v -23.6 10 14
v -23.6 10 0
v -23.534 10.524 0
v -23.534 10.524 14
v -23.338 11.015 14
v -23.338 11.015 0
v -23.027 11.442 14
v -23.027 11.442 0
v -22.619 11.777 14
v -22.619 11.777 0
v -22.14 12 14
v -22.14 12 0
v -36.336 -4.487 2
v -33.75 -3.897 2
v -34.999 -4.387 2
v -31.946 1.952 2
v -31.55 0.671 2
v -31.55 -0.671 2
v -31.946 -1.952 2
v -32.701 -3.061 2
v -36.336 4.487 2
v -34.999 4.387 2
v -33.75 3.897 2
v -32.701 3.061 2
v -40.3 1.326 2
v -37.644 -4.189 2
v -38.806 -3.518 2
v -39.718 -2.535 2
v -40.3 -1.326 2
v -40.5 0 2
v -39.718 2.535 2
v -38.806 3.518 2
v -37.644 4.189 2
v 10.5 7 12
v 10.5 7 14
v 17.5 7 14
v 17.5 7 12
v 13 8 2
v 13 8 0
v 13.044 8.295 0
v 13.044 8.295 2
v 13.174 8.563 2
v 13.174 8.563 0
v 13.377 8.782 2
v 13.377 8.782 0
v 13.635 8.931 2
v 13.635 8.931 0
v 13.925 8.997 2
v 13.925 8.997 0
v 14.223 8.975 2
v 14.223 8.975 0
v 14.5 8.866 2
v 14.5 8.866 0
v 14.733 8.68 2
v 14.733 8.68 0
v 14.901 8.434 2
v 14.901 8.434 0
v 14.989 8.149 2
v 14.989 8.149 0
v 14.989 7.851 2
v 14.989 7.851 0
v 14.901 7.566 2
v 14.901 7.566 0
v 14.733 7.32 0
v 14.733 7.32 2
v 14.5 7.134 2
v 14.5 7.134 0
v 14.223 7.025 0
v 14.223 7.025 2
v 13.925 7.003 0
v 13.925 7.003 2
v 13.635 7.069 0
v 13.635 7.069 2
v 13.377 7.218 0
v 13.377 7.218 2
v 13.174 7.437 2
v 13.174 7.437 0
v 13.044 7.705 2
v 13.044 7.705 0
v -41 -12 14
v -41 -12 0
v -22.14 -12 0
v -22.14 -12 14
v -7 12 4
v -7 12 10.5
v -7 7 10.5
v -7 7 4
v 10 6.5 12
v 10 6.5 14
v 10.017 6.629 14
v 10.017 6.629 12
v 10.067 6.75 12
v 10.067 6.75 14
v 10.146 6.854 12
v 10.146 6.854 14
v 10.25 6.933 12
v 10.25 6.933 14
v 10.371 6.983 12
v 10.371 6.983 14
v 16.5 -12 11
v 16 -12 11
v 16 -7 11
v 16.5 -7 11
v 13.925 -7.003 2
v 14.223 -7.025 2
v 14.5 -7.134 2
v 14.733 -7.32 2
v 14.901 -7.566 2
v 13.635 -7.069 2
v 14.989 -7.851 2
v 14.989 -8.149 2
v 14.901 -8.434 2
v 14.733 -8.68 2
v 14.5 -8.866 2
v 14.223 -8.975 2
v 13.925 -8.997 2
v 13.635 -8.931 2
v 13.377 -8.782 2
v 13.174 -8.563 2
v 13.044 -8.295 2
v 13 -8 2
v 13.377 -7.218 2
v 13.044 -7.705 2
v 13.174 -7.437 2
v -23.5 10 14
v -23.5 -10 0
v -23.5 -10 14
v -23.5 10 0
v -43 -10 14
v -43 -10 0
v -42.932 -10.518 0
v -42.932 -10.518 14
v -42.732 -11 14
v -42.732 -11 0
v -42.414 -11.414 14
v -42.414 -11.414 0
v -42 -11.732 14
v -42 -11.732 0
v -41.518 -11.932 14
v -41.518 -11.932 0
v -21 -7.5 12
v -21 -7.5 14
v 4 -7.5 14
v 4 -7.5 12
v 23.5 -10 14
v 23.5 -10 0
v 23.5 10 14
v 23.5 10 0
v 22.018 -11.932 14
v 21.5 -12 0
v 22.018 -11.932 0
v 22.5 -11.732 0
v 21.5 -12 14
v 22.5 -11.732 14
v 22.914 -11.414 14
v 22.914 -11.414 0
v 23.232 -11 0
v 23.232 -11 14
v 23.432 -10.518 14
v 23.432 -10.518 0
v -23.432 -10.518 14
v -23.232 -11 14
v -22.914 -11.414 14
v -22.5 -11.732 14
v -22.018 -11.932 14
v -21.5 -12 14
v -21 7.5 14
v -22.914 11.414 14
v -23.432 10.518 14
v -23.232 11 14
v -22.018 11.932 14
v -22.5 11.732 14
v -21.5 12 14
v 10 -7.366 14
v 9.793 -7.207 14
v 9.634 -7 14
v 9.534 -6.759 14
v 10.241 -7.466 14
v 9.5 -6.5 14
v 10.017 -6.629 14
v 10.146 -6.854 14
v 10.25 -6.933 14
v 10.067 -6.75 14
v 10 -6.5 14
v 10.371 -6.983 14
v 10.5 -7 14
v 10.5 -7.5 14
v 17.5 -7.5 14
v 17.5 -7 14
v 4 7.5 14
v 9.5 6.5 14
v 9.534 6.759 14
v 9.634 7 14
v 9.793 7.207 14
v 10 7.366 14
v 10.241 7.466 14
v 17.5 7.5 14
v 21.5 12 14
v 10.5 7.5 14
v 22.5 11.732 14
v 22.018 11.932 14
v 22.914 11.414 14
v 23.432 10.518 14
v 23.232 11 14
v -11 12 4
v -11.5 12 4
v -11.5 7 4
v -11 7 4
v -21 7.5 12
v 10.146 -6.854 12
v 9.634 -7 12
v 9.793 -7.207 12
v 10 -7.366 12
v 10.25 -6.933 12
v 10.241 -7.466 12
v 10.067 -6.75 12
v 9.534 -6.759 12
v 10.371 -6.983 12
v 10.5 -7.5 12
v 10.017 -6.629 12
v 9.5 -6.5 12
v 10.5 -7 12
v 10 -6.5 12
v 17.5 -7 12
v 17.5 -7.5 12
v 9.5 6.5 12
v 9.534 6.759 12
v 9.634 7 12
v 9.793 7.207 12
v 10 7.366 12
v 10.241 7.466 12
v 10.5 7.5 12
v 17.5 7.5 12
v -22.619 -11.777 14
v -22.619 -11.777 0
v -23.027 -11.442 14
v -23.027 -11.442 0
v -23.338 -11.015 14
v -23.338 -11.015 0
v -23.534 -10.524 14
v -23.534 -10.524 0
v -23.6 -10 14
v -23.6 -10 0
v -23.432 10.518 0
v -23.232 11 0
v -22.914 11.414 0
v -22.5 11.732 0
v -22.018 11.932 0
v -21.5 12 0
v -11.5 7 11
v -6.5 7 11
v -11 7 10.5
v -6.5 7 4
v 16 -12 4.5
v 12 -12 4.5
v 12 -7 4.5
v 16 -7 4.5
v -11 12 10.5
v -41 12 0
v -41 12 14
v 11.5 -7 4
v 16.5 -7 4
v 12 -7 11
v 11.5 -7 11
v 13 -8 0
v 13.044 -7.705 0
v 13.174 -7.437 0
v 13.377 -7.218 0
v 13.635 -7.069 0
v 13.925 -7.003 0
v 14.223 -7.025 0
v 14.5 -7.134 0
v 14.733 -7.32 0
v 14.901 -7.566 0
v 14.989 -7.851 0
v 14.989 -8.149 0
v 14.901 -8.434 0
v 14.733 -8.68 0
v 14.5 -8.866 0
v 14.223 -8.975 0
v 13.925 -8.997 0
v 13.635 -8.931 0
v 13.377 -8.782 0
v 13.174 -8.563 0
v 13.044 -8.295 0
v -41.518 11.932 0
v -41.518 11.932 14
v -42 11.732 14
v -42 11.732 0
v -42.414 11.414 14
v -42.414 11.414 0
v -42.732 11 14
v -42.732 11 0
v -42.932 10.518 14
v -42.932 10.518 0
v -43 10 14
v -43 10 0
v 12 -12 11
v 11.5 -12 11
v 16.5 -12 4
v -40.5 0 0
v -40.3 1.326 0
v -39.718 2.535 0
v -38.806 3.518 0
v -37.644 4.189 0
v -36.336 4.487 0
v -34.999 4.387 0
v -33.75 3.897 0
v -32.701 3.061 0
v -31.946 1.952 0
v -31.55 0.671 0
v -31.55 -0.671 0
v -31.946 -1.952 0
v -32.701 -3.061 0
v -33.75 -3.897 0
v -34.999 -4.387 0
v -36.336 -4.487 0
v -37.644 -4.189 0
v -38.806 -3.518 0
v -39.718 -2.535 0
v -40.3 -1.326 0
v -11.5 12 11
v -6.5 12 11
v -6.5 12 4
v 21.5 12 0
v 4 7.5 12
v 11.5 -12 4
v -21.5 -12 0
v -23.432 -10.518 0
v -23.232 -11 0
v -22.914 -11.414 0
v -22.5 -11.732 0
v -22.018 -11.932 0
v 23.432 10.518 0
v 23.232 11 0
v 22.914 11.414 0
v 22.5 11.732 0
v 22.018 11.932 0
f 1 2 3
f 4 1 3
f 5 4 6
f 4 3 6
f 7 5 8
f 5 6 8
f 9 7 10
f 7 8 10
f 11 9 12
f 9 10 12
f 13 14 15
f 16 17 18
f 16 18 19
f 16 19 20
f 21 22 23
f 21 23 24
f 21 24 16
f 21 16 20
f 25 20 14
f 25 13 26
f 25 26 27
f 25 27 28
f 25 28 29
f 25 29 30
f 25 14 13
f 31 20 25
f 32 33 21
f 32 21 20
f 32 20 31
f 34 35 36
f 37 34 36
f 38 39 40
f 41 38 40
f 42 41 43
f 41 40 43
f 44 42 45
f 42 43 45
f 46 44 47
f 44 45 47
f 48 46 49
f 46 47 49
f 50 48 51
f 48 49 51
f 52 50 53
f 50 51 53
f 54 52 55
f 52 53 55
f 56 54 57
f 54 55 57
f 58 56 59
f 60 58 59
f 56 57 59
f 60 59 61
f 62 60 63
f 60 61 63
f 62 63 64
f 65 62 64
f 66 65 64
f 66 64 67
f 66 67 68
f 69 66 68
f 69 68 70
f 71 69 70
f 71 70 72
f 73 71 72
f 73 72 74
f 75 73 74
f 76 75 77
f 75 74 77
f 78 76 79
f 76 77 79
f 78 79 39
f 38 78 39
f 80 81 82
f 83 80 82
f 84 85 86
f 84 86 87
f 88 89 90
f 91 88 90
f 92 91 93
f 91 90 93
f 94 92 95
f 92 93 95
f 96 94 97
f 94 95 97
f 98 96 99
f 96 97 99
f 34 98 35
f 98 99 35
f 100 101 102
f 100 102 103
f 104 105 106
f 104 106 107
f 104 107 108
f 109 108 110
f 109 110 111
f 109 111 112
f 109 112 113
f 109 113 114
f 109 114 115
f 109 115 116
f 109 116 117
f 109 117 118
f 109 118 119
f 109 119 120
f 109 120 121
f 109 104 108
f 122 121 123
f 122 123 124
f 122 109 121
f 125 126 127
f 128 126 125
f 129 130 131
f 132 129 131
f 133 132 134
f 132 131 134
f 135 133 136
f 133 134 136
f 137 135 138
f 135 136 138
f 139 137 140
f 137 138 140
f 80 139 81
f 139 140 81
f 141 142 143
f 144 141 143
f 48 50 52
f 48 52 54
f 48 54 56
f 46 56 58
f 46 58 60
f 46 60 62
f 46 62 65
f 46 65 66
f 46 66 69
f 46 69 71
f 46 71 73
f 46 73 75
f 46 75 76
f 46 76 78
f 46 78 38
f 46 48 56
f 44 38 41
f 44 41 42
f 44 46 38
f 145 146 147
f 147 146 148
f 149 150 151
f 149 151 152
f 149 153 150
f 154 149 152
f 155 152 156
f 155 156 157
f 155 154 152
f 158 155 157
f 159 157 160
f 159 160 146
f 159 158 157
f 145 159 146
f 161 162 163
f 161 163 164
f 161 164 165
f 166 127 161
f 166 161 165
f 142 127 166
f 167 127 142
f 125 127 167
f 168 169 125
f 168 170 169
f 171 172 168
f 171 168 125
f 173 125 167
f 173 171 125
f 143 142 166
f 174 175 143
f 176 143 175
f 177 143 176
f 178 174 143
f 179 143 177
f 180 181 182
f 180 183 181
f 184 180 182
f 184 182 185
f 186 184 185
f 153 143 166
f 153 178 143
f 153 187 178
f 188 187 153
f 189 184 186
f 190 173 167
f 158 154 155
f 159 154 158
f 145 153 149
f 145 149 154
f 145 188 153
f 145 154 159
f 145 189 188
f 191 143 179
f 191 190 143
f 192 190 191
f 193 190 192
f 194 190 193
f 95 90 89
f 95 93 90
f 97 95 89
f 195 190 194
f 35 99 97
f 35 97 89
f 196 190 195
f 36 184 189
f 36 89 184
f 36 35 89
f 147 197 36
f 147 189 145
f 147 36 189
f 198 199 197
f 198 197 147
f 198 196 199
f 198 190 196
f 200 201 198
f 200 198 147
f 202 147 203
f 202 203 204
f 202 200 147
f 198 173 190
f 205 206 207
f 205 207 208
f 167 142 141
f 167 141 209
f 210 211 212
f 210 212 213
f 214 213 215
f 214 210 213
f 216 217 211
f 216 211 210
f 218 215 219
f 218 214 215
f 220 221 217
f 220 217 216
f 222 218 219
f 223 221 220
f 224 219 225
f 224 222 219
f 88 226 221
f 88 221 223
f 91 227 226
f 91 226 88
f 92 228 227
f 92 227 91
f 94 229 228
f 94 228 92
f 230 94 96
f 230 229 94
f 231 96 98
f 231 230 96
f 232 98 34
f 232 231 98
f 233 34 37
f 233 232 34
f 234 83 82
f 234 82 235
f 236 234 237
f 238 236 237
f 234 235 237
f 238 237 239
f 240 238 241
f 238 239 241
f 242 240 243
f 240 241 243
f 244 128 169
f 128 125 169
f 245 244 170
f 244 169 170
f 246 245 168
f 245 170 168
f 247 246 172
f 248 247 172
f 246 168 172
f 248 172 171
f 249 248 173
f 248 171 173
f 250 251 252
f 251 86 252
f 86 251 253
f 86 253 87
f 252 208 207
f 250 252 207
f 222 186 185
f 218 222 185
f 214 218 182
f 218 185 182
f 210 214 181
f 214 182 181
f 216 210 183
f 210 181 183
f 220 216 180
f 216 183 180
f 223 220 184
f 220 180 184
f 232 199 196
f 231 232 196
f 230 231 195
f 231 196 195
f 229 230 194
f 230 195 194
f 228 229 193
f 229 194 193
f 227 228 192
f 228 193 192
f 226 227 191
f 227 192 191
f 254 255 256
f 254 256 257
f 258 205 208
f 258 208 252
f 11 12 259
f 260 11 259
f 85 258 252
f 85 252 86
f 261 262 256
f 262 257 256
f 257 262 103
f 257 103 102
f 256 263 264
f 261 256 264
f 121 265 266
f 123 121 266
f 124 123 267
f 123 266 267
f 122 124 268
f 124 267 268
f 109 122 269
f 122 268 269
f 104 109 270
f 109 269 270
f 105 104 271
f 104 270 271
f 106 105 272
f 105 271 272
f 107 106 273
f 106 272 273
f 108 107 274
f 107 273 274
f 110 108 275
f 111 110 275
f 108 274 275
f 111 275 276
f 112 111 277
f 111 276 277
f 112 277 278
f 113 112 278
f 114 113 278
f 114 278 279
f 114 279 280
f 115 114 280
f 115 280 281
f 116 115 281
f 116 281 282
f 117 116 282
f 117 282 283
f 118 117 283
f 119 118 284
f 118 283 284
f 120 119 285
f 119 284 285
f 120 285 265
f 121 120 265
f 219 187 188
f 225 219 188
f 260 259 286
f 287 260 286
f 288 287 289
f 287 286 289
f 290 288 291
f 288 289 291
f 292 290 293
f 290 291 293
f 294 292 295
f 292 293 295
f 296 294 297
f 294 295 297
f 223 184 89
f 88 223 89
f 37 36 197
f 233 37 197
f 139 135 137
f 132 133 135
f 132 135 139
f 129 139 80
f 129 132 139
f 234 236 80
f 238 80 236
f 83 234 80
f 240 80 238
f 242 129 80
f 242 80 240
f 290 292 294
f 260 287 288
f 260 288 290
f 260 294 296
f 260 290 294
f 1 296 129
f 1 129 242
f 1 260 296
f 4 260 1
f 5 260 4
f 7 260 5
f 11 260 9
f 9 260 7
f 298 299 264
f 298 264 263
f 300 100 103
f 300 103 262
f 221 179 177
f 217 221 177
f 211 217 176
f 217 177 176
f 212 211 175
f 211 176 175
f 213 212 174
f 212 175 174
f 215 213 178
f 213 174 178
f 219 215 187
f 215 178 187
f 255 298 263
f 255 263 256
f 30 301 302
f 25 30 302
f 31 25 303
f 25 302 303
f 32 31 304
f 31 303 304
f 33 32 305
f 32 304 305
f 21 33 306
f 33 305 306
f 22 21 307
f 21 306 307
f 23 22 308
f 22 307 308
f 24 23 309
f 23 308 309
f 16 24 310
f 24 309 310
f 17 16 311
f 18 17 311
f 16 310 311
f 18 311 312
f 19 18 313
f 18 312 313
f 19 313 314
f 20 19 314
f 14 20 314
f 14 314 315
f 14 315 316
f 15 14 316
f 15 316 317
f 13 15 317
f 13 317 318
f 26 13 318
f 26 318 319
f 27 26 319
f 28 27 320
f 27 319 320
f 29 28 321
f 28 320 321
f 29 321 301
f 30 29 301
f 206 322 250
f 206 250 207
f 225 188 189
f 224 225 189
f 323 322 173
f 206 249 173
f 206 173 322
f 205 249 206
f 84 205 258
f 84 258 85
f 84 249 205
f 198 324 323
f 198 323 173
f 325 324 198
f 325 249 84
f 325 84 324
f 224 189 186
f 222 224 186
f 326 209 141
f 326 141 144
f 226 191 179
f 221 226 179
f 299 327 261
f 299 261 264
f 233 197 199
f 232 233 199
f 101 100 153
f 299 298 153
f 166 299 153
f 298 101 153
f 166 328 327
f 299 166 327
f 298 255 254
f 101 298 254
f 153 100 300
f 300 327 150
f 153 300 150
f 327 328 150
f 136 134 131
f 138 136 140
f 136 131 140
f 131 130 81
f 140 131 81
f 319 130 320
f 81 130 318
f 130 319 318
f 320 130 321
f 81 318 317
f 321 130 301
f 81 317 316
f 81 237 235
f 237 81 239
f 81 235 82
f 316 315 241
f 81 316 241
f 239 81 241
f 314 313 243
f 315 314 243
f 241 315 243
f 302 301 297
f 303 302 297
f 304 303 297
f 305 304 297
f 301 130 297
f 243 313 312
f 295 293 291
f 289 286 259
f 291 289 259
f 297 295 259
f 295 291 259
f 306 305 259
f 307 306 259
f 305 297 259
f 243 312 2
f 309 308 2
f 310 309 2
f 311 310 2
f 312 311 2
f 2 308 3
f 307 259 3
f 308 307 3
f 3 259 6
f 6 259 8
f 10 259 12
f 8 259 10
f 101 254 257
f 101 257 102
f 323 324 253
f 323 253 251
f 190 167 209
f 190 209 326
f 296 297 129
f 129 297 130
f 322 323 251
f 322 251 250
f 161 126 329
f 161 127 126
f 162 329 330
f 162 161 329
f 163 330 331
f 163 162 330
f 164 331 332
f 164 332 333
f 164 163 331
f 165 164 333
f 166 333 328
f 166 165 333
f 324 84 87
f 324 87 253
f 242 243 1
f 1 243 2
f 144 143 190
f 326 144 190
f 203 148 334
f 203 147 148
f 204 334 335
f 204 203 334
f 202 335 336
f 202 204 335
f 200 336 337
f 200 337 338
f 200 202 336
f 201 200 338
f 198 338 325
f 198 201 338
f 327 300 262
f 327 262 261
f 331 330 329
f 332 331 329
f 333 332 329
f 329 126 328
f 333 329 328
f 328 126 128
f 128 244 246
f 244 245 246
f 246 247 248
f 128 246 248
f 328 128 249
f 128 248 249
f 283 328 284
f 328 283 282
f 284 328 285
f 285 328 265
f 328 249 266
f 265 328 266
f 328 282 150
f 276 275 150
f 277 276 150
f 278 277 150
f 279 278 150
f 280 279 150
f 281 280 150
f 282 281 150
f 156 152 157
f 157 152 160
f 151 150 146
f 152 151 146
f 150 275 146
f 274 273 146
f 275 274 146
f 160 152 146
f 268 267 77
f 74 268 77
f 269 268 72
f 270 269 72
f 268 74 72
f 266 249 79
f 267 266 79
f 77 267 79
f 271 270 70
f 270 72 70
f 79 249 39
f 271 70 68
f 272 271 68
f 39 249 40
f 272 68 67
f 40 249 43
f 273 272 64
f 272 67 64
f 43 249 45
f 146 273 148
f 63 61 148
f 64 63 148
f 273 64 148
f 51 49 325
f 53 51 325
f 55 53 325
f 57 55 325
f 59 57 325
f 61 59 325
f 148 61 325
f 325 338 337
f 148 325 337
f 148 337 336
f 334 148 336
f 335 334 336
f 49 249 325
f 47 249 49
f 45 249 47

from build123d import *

# Parameters (mm, degrees)
CROQUIS1_W              = 47
CROQUIS1_H              = 24
SALIENTE_EXTRUIR1_DEPTH = 14
REDONDEO1_R             = 2
CROQUIS2_W              = 25
CROQUIS2_H              = 15
CORTAR_EXTRUIR1_DEPTH   = 2
CORTAR_EXTRUIR2_DEPTH   = 5
CORTAR_EXTRUIR3_DEPTH   = 5
SALIENTE_EXTRUIR3_DEPTH = 14
CROQUIS6_R              = 4.5
CROQUIS6_R_2            = 1
CORTAR_EXTRUIR4_DEPTH   = 2


with BuildPart() as part:
    # Croquis1 → Saliente-Extruir1 (new body)
    with BuildSketch(Plane.XY):
        Rectangle(CROQUIS1_W, CROQUIS1_H)
    extrude(amount=SALIENTE_EXTRUIR1_DEPTH)

    # Redondeo1
    redondeo1_edges = [part.edges().sort_by_distance(p)[0] for p in [
        (-23.5, 12, 7),
        (23.5, 12, 7),
        (23.5, -12, 7),
        (-23.5, -12, 7),
    ]]
    fillet(redondeo1_edges, radius=REDONDEO1_R)

    # Croquis2 → Cortar-Extruir1 (cut)
    with BuildSketch(Plane.XY.offset(14)):
        with Locations((-8.5, 0)):
            Rectangle(CROQUIS2_W, CROQUIS2_H)
        with BuildLine():
            Line((17.5, 7.5), (10.5, 7.5))
            ThreePointArc((10.5, 7.5), (9.792893219, 7.207106781), (9.5, 6.5))
            Line((9.5, 6.5), (9.5, -6.5))
            ThreePointArc((9.5, -6.5), (9.792893219, -7.207106781), (10.5, -7.5))
            Line((10.5, -7.5), (17.5, -7.5))
            Line((17.5, -7.5), (17.5, -7))
            Line((17.5, -7), (10.5, -7))
            ThreePointArc((10.5, -7), (10.146446609, -6.853553391), (10, -6.5))
            Line((10, -6.5), (10, 6.5))
            ThreePointArc((10, 6.5), (10.146446609, 6.853553391), (10.5, 7))
            Line((10.5, 7), (17.5, 7))
            Line((17.5, 7), (17.5, 7.5))
        make_face()
    extrude(amount=-CORTAR_EXTRUIR1_DEPTH, mode=Mode.SUBTRACT)

    # Croquis3 → Cortar-Extruir2 (cut)
    with BuildSketch(Plane(origin=(0, 12, 0), x_dir=(1, 0, 0), z_dir=(0, 1, 0))):
        Polygon((-6.5, -4), (-6.5, -11), (-11.5, -11), (-11.5, -4), (-11, -4), (-11, -10.5), (-7, -10.5), (-7, -4), align=None)
    extrude(amount=-CORTAR_EXTRUIR2_DEPTH, mode=Mode.SUBTRACT)

    # Croquis4 → Cortar-Extruir3 (cut)
    with BuildSketch(Plane.XZ.offset(12)):
        Polygon((16.5, 11), (16.5, 4), (11.5, 4), (11.5, 11), (12, 11), (12, 4.5), (16, 4.5), (16, 11), align=None)
    extrude(amount=-CORTAR_EXTRUIR3_DEPTH, mode=Mode.SUBTRACT)


with BuildPart() as body_2:
    # Croquis5 → Saliente-Extruir3 (new body)
    with BuildSketch(Plane.XY):
        with BuildLine():
            Line((-22.140312424, 12), (-41, 12))
            ThreePointArc((-41, 12), (-42.414213562, 11.414213562), (-43, 10))
            Line((-43, 10), (-43, -10))
            ThreePointArc((-43, -10), (-42.414213562, -11.414213562), (-41, -12))
            Line((-41, -12), (-22.140312424, -12))
            ThreePointArc((-22.140312424, -12), (-23.19626886, -11.23801129), (-23.6, -10))
            Line((-23.6, -10), (-23.6, 10))
            ThreePointArc((-23.6, 10), (-23.19626886, 11.23801129), (-22.140312424, 12))
        make_face()
    extrude(amount=SALIENTE_EXTRUIR3_DEPTH)


with BuildPart() as cortar_extruir4_tool:
    # Croquis6 → Cortar-Extruir4 (new body)
    with BuildSketch(Plane(origin=(0, 0, 0), x_dir=(-1, 0, 0), z_dir=(0, 0, -1))):
        with Locations((36, 0)):
            Circle(CROQUIS6_R)
        with Locations((-14, 8)):
            Circle(CROQUIS6_R_2)
        with Locations((-14, -8)):
            Circle(CROQUIS6_R_2)
    extrude(amount=-CORTAR_EXTRUIR4_DEPTH)


with BuildPart() as part_1:
    add(part.part)

    # Cortar-Extruir4: cut by cortar_extruir4_tool
    add(cortar_extruir4_tool.part, mode=Mode.SUBTRACT)


with BuildPart() as body_2_1:
    add(body_2.part)

    # Cortar-Extruir4: cut by cortar_extruir4_tool
    add(cortar_extruir4_tool.part, mode=Mode.SUBTRACT)


solid = Compound([part_1.part, body_2_1.part])
